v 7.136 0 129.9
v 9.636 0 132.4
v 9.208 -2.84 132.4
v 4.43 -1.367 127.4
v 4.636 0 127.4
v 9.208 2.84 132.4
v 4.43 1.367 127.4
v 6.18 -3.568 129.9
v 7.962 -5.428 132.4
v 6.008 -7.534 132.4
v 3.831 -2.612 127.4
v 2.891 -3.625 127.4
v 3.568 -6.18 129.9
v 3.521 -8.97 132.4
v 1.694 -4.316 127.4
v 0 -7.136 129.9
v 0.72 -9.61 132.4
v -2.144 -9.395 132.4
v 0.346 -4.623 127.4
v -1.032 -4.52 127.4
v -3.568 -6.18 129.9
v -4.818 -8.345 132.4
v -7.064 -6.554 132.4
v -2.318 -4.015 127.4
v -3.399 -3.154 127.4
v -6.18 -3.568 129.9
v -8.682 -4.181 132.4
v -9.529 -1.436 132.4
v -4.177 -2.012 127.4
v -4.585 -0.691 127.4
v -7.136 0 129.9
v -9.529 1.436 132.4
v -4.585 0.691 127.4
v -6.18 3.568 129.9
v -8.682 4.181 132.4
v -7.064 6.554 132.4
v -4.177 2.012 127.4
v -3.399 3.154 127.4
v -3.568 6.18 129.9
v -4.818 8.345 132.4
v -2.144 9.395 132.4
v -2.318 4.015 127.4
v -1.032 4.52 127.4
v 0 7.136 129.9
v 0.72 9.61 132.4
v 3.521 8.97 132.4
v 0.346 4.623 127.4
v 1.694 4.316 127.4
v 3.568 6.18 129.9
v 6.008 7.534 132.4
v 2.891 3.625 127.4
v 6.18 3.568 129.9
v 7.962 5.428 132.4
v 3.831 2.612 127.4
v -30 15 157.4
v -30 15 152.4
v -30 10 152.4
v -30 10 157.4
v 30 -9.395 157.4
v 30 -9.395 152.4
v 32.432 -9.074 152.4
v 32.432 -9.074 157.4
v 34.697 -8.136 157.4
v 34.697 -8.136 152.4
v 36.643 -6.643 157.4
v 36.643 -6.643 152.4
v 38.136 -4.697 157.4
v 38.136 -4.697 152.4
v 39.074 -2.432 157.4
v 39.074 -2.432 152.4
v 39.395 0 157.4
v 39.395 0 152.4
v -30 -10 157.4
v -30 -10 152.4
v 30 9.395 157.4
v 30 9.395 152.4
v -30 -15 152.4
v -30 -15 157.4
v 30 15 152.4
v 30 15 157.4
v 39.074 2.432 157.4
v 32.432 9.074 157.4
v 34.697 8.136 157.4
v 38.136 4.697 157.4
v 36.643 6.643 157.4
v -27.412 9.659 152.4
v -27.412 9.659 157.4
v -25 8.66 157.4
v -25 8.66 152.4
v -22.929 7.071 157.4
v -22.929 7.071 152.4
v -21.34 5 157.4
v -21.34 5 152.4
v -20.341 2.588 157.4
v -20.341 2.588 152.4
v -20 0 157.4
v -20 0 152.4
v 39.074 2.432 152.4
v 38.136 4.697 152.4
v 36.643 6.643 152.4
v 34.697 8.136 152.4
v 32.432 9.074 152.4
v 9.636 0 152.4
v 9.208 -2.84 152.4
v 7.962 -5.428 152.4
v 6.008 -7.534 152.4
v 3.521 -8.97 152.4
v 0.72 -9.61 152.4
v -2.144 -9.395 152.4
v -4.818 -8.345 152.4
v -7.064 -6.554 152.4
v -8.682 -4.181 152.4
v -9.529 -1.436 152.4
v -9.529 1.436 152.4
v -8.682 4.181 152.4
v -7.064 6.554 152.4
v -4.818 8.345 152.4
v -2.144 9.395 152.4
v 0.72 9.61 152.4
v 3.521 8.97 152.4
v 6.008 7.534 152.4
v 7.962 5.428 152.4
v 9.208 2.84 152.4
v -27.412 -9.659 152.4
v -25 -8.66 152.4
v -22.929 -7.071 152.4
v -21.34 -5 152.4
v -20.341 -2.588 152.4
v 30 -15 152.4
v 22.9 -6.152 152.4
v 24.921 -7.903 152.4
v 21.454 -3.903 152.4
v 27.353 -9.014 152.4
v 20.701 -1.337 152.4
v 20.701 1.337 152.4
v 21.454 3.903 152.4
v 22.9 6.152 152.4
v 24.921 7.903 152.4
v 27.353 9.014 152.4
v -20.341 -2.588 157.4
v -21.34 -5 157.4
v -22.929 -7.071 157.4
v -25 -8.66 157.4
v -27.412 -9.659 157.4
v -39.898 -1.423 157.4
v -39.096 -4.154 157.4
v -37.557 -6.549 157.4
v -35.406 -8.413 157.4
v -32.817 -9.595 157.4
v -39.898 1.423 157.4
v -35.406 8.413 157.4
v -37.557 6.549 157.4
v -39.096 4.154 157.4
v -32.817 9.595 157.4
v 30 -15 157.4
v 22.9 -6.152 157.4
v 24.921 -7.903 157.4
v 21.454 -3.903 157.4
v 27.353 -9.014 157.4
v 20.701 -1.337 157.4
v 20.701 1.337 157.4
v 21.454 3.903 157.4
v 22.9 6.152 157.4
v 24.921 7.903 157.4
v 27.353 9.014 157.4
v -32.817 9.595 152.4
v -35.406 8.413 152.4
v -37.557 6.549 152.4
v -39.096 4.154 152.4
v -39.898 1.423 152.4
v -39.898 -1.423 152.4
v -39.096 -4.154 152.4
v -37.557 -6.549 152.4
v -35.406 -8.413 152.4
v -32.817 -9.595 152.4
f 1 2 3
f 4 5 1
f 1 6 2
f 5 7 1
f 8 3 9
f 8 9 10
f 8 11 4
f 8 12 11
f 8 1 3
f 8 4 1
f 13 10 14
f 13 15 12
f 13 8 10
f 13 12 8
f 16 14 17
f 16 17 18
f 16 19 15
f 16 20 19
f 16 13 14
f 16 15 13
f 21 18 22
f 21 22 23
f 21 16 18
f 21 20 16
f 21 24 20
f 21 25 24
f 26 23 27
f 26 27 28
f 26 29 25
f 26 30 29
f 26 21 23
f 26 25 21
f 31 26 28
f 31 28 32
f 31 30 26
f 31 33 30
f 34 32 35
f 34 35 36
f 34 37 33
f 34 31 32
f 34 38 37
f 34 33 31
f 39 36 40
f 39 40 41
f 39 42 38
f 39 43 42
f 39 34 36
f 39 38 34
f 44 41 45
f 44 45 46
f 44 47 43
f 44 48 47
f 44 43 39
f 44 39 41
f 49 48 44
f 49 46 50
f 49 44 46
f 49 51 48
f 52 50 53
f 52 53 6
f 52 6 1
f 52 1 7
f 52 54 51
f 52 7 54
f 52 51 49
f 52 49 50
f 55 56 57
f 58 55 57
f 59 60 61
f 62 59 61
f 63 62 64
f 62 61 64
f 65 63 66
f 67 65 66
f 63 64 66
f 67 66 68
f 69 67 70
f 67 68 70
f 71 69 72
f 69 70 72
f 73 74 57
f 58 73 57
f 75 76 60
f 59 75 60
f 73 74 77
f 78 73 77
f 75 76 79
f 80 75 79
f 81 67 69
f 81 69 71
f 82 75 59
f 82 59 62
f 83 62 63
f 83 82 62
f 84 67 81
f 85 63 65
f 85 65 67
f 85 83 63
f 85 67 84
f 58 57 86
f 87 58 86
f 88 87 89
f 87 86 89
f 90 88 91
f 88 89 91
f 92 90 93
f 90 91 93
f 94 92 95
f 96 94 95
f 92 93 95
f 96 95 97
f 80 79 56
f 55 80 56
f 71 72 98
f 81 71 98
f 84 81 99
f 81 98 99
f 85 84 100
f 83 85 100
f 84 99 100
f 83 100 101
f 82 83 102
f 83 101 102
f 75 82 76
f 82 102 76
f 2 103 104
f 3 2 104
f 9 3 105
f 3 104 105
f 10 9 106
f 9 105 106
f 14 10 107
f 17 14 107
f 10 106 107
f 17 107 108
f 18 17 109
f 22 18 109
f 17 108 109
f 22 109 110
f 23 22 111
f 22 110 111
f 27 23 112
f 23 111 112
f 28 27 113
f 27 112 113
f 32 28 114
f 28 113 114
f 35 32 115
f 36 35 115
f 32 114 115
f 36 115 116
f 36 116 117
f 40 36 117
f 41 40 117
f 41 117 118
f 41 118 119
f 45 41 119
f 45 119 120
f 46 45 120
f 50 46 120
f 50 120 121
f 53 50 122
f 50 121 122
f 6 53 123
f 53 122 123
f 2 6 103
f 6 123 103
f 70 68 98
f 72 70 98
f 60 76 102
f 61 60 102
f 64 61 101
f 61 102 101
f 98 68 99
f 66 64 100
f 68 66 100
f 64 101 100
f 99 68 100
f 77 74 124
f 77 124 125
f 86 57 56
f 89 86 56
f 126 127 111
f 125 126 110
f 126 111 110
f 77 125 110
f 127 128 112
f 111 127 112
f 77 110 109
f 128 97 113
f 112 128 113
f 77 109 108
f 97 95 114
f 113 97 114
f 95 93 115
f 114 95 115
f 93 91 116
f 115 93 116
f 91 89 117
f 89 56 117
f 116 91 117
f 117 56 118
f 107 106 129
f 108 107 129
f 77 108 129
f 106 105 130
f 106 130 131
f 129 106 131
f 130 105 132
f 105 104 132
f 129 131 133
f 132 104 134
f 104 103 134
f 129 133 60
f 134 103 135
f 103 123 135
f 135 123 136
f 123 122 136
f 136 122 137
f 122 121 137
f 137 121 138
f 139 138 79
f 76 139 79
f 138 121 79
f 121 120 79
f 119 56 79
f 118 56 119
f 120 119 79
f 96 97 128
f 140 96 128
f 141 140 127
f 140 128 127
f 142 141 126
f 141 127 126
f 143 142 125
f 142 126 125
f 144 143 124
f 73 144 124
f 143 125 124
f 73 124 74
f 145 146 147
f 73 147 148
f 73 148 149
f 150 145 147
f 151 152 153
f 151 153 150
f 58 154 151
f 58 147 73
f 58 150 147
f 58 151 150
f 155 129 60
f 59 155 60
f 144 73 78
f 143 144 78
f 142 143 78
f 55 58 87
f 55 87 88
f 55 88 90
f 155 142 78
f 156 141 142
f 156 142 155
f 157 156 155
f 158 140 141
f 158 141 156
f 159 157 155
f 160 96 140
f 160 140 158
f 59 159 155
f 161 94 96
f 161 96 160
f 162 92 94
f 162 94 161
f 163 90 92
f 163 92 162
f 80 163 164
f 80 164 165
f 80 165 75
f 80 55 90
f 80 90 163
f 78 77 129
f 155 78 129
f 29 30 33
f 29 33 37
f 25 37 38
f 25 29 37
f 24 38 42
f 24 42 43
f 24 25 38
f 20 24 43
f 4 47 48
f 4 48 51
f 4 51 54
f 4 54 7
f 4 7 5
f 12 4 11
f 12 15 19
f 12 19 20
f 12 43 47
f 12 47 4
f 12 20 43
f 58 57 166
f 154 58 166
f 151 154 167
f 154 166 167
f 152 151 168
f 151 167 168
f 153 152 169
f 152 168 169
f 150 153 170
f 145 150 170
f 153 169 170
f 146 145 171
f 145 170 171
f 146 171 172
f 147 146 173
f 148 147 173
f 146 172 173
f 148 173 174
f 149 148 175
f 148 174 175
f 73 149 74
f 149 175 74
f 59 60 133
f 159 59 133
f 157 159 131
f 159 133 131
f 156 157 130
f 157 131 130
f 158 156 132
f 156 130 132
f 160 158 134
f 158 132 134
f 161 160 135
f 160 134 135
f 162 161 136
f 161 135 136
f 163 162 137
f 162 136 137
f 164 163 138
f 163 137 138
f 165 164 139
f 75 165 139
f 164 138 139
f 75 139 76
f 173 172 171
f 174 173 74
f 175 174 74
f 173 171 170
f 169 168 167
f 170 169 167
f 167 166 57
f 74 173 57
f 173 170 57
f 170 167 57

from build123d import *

# Parameters (mm, degrees)
F2_DEPTH = 5
F3_R     = 9.6364539138
F4_DEPTH = 25
F5_SIZE  = 5


with BuildPart() as f2:
    # F1 (on offset) → F2 (new body)
    with BuildSketch(Plane.XY.offset(152.4)):
        with BuildLine():
            Line((30, 15), (-30, 15))
            Line((-30, 15), (-30, 10))
            ThreePointArc((-30, 10), (-22.9289321881, 7.0710678119), (-20, 0))
            ThreePointArc((-20, 0), (-22.9289321881, -7.0710678119), (-30, -10))
            Line((-30, -10), (-30, -15))
            Line((-30, -15), (30, -15))
            Line((30, -15), (30, -9.3946087251))
            ThreePointArc((30, -9.3946087251), (20.6053912749, 0), (30, 9.3946087251))
            Line((30, 9.3946087251), (30, 15))
        make_face()
    extrude(amount=F2_DEPTH)

    # F3 (on face) → F4 (join)
    with BuildSketch(Plane(origin=(0, 0, 152.4), x_dir=(1, 0, 0), z_dir=(0, 0, -1))):
        Circle(F3_R)
    extrude(amount=F4_DEPTH)

    # F5
    f5_edges = [f2.edges().sort_by_distance(p)[0] for p in [
        (-9.636454, 0, 127.4),
    ]]
    chamfer(f5_edges, length=F5_SIZE)


with BuildPart() as f2b:
    # F1 (on offset) → F2, piece 2 (new body)
    with BuildSketch(Plane.XY.offset(152.4)):
        with BuildLine():
            Line((-30, -10), (-30, 10))
            ThreePointArc((-30, 10), (-40, 0), (-30, -10))
        make_face()
    extrude(amount=F2_DEPTH)


with BuildPart() as f2c:
    # F1 (on offset) → F2, piece 3 (new body)
    with BuildSketch(Plane.XY.offset(152.4)):
        with BuildLine():
            ThreePointArc((39.3946087251, 0), (36.6429915361, 6.6429915361), (30, 9.3946087251))
            Line((30, 9.3946087251), (30, -9.3946087251))
            ThreePointArc((30, -9.3946087251), (36.6429915361, -6.6429915361), (39.3946087251, 0))
        make_face()
    extrude(amount=F2_DEPTH)


solid = Compound([f2.part, f2b.part, f2c.part])
